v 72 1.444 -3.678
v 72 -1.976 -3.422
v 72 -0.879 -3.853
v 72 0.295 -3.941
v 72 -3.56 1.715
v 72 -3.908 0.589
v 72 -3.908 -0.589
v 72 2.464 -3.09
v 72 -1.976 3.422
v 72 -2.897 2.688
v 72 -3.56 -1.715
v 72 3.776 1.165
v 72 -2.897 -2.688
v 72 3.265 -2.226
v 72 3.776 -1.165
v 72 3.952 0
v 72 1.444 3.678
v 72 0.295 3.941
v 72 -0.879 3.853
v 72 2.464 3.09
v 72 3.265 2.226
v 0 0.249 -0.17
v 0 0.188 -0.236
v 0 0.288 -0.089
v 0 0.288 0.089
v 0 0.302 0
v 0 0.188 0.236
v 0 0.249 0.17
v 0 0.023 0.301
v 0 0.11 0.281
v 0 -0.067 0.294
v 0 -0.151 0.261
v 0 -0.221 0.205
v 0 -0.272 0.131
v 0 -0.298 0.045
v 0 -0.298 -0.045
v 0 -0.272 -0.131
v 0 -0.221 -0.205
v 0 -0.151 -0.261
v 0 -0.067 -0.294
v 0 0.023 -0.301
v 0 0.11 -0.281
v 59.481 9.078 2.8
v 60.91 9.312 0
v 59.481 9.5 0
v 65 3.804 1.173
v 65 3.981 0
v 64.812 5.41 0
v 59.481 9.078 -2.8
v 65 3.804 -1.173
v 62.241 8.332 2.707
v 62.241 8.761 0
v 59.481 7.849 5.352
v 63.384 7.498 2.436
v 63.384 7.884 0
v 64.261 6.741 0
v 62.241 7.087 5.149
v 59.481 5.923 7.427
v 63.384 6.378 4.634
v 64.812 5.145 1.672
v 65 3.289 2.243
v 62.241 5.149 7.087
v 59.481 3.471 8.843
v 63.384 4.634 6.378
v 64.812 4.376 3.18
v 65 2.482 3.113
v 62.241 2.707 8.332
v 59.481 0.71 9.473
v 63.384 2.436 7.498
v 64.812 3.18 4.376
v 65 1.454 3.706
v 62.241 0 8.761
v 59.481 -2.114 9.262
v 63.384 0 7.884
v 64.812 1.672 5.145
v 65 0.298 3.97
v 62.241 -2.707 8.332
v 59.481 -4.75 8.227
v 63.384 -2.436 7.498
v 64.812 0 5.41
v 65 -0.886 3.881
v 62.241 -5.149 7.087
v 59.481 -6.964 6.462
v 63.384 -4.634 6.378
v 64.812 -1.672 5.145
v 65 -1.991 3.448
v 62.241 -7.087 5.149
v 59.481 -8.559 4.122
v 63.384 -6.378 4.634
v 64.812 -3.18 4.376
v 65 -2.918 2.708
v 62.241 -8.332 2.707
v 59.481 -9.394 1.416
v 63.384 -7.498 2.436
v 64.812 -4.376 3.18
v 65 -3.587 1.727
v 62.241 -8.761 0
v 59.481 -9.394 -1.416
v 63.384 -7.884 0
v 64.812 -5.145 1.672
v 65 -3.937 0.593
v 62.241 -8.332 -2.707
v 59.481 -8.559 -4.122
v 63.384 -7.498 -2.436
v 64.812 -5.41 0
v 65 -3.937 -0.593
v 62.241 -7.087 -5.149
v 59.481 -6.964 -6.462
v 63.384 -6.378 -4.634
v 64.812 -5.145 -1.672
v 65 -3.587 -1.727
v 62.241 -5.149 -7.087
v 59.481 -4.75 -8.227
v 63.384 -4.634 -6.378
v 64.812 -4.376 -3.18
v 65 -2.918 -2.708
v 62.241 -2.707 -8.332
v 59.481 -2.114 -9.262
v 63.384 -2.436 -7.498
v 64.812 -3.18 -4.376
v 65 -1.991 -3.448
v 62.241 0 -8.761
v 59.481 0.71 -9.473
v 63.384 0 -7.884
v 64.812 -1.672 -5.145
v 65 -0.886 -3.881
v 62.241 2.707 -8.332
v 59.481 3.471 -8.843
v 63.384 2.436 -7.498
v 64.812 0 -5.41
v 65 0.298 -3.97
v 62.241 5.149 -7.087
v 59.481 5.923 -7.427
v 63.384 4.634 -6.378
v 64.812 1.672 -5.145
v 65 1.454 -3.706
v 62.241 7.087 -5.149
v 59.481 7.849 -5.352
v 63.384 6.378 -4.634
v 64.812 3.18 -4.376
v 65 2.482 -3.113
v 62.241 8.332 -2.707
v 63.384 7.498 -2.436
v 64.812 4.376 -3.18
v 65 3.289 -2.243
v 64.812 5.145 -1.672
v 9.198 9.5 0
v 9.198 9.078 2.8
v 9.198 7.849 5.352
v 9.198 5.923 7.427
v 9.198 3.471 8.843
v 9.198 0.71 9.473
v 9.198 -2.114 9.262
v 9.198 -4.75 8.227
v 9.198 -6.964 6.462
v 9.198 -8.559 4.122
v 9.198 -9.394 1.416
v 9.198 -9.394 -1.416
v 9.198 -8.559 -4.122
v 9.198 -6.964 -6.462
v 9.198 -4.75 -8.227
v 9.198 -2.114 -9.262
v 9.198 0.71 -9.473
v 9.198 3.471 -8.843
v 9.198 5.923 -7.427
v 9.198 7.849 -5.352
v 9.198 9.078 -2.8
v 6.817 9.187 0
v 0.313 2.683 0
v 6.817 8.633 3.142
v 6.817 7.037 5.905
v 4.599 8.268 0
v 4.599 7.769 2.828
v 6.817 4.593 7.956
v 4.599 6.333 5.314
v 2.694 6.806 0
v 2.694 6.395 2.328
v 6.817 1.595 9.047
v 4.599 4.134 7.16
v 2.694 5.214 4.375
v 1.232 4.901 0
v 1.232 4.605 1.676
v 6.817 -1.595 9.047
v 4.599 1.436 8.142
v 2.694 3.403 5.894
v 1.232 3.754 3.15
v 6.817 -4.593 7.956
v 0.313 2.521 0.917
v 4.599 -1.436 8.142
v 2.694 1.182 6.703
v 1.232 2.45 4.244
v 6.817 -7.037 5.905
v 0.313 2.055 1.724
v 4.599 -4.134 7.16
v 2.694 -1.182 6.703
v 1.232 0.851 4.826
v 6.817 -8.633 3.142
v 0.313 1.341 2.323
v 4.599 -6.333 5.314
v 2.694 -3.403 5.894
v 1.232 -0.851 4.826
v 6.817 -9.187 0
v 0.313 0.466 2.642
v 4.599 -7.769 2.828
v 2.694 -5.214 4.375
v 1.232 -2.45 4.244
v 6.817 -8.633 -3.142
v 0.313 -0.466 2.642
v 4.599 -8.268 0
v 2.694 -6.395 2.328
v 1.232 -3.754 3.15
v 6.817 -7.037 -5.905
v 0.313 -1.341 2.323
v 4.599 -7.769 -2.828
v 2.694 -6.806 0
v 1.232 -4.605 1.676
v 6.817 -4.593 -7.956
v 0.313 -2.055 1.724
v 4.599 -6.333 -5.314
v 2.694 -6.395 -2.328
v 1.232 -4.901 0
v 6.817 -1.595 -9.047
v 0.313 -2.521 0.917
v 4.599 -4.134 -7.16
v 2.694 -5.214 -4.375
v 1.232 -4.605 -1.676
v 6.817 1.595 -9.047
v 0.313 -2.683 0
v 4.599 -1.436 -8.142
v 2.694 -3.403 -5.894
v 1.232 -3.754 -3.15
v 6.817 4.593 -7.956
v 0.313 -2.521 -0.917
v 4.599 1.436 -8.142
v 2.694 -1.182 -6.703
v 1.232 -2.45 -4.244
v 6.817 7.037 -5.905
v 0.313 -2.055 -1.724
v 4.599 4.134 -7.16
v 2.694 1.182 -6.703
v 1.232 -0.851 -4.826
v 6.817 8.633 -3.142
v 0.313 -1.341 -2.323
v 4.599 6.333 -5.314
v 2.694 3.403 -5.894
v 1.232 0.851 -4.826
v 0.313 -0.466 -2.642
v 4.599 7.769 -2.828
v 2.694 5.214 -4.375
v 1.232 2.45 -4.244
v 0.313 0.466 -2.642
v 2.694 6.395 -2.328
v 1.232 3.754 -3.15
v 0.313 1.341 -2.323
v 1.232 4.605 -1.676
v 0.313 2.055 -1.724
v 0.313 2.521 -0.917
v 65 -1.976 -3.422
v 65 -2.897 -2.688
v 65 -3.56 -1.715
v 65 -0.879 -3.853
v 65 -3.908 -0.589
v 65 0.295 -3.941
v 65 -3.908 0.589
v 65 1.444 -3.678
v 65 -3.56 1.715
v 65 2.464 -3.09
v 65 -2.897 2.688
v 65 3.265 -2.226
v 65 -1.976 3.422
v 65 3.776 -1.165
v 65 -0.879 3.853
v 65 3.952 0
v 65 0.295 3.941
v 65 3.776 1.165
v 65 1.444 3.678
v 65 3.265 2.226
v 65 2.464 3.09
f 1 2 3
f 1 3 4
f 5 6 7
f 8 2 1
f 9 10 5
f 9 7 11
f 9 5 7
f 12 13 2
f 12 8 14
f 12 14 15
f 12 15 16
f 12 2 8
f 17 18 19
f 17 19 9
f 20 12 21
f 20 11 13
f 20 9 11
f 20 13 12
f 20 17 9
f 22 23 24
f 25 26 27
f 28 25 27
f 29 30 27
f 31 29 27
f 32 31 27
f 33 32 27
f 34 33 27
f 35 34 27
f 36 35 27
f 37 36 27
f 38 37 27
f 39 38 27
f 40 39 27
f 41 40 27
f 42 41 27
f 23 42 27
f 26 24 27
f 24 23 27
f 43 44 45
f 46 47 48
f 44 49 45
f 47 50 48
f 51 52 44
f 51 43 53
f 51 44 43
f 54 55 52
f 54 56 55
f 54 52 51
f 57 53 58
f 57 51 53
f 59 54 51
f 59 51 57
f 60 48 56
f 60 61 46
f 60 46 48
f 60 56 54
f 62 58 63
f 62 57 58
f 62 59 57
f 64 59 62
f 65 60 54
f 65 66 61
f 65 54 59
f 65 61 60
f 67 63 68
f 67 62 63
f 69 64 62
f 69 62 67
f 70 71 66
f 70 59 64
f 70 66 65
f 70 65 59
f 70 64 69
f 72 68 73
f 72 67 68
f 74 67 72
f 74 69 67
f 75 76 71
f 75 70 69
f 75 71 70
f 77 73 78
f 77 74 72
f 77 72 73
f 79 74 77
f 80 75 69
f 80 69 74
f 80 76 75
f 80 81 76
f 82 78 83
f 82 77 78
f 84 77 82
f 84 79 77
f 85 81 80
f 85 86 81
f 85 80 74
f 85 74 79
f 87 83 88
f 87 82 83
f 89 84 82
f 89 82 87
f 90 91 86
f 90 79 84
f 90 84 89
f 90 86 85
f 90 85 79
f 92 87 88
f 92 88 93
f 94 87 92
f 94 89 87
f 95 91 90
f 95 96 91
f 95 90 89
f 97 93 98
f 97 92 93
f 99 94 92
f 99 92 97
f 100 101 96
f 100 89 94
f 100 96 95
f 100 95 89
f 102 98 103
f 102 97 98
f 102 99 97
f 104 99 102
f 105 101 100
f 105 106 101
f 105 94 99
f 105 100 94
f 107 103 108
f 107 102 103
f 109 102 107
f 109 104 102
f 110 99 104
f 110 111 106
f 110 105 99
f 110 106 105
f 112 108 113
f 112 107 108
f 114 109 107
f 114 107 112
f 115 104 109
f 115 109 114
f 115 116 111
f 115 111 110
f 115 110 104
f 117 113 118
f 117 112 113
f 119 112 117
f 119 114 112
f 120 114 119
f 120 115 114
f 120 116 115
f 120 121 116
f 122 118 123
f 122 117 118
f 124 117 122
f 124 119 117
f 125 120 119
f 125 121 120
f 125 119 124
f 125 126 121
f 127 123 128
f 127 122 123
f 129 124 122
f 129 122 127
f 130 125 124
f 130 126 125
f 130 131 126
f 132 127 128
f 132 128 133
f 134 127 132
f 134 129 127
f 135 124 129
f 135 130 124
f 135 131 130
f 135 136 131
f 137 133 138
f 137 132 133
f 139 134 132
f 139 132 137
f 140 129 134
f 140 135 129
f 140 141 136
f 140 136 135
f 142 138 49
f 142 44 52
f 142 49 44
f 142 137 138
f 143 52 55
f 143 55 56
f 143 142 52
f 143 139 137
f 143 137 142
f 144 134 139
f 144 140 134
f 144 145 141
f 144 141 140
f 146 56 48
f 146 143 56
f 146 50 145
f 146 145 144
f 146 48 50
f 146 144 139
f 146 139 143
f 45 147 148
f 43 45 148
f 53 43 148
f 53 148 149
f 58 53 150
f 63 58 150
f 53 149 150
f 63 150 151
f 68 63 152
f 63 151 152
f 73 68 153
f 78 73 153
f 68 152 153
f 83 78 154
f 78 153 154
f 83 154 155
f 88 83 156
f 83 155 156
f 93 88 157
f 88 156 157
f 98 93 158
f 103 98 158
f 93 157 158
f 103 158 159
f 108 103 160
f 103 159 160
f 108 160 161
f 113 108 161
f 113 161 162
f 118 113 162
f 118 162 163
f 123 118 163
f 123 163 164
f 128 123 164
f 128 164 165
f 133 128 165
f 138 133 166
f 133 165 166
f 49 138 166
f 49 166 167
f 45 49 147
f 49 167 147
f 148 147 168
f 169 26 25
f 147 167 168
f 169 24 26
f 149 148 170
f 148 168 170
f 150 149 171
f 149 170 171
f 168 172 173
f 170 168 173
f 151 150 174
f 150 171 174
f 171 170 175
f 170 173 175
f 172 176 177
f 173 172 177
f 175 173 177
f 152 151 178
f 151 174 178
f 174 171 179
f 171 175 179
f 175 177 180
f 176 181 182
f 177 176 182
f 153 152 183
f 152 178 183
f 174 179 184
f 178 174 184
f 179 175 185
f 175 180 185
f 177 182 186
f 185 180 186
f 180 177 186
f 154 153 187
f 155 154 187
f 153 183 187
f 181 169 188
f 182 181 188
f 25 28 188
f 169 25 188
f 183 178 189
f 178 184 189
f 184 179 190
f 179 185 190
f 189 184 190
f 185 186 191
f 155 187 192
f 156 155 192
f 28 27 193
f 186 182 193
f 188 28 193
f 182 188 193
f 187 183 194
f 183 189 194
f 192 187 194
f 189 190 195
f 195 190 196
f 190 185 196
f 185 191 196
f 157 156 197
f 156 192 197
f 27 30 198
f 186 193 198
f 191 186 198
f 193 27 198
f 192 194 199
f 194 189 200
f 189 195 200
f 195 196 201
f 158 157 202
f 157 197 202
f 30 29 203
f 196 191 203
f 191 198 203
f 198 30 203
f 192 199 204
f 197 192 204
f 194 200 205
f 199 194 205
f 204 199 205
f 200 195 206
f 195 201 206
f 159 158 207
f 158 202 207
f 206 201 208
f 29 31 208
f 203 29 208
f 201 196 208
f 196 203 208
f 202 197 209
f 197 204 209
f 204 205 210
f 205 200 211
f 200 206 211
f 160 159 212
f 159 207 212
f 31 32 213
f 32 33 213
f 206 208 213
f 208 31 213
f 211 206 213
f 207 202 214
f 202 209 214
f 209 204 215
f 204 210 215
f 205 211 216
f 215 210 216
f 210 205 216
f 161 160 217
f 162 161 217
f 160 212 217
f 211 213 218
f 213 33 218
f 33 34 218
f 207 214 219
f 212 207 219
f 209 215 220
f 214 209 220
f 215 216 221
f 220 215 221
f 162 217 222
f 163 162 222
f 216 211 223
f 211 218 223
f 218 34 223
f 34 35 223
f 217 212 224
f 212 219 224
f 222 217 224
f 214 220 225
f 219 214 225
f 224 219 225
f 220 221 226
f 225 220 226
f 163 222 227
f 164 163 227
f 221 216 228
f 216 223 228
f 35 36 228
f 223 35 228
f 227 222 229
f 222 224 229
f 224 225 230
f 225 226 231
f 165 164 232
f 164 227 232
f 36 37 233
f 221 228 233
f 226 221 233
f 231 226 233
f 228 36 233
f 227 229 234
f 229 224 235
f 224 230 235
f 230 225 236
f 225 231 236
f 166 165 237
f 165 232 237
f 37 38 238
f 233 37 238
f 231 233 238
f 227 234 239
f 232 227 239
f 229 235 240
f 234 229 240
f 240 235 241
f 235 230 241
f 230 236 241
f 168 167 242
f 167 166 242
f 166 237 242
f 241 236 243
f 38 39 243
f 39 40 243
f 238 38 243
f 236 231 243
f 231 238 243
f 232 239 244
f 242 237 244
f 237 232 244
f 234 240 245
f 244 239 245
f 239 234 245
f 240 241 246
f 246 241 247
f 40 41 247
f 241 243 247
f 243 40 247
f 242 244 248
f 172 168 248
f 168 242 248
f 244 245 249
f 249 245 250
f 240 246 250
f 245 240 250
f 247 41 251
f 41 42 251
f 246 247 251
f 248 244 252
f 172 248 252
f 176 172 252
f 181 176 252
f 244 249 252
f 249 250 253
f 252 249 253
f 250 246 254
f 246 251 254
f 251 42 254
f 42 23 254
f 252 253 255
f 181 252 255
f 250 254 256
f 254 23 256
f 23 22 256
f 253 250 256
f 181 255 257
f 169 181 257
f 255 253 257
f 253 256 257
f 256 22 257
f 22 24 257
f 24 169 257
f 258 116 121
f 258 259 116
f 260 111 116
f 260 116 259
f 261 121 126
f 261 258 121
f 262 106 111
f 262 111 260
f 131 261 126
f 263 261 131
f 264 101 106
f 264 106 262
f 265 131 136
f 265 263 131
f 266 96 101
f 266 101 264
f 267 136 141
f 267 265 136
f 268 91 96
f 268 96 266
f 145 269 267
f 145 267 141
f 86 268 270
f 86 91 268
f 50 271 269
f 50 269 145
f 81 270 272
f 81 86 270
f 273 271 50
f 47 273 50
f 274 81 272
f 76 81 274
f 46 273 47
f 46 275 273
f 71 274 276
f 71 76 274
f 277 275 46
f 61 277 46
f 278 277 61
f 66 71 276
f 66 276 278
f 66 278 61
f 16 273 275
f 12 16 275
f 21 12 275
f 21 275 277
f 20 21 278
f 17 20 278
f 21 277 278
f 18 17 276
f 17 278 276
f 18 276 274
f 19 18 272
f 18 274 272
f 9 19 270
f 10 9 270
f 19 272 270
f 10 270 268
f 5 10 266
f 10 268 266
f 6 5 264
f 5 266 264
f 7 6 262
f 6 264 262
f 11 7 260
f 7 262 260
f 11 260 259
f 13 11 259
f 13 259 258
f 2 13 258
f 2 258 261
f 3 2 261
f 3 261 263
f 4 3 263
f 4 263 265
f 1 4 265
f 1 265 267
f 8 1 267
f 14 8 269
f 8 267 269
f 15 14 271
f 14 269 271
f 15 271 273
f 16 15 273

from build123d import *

# Parameters (mm, degrees)
F0_R     = 9.5
F1_DEPTH = 65
F2_R     = 9.198154
F3_R     = 5.518892
F4_R     = 3.951645
F5_DEPTH = 7


with BuildPart() as f1:
    # F0 (on Right) → F1 (new body)
    with BuildSketch(Plane.YZ):
        Circle(F0_R)
    extrude(amount=F1_DEPTH)

    # F2
    f2_edges = [f1.edges().sort_by_distance(p)[0] for p in [
        (0, -9.5, 0),
    ]]
    fillet(f2_edges, radius=F2_R)

    # F3
    f3_edges = [f1.edges().sort_by_distance(p)[0] for p in [
        (65, -9.5, 0),
    ]]
    fillet(f3_edges, radius=F3_R)

    # F4 (on face) → F5 (join)
    with BuildSketch(Plane.YZ.offset(65)):
        Circle(F4_R)
    extrude(amount=F5_DEPTH)


solid = f1.part
